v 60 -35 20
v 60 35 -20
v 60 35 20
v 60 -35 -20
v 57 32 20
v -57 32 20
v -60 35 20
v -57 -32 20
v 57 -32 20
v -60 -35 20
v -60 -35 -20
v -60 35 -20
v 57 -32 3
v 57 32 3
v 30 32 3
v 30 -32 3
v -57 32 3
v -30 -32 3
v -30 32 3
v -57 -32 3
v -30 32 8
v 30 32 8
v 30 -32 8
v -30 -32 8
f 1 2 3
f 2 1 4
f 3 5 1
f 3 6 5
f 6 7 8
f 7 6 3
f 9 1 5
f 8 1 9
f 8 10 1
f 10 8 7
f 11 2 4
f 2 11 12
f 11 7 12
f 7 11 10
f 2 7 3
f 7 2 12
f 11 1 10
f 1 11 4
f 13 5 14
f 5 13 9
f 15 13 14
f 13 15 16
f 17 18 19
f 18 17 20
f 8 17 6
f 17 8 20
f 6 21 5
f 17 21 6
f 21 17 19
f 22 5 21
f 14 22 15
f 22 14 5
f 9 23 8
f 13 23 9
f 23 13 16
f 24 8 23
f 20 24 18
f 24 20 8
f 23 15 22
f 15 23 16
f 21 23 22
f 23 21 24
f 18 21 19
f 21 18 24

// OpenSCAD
// Buffer tank for a mini horizontal gel-electrophoresis box
// Print orientation: rests on XY plane at z = 0, builds upward (+Z), centred on origin in X and Y.

// ---- Outer envelope ----
L = 120;   // outer length along X
W = 70;    // outer width  along Y
H = 40;    // outer height along Z

// ---- Wall / floor thickness ----
t = 3;     // uniform wall and floor thickness

// ---- Inner cavity (open top) ----
Li = L - 2*t;   // 114 mm inner length
Wi = W - 2*t;   //  64 mm inner width
Hi = H - t;     //  37 mm inner depth (floor top at z = 3)

// ---- Central gel-tray platform ----
pL = 60;        // platform length along X (centred)
pH = 10;        // platform height above the inner floor (top at z = 13)

// ---- Electrode-wire holes (through both X end walls) ----
d  = 2;         // hole diameter
hy = 0;         // hole centre Y (on the centreline)
hz = 30;        // hole centre Z

$fn = 64;       // round holes

// ---- Base solid: outer box minus inner cavity (open top) ----
module tank() { difference() {
    cube([L, W, H], center = true);
    // cavity extends 1 mm past the top so the top face is fully open
    translate([-Li/2, -Wi/2, t])
        cube([Li, Wi, Hi + 1]);
} }

// ---- Solid raised platform (spans full inner width, centred in X) ----
module platform() { translate([0, 0, t])
    cube([pL, Wi, pH], center = true); }

// ---- Electrode-wire holes: cylinders along X, extended 1 mm past each end wall ----
module wire_holes() { for (sx = [-1, 1])
    translate([sx * (L/2 + 1), hy, hz])
        rotate([0, 90, 0])
            cylinder(h = L + 2, r = d/2, center = true); }

// ---- Final part ----
difference() {
    union() {
        tank();
        platform();
    }
    wire_holes();
}
